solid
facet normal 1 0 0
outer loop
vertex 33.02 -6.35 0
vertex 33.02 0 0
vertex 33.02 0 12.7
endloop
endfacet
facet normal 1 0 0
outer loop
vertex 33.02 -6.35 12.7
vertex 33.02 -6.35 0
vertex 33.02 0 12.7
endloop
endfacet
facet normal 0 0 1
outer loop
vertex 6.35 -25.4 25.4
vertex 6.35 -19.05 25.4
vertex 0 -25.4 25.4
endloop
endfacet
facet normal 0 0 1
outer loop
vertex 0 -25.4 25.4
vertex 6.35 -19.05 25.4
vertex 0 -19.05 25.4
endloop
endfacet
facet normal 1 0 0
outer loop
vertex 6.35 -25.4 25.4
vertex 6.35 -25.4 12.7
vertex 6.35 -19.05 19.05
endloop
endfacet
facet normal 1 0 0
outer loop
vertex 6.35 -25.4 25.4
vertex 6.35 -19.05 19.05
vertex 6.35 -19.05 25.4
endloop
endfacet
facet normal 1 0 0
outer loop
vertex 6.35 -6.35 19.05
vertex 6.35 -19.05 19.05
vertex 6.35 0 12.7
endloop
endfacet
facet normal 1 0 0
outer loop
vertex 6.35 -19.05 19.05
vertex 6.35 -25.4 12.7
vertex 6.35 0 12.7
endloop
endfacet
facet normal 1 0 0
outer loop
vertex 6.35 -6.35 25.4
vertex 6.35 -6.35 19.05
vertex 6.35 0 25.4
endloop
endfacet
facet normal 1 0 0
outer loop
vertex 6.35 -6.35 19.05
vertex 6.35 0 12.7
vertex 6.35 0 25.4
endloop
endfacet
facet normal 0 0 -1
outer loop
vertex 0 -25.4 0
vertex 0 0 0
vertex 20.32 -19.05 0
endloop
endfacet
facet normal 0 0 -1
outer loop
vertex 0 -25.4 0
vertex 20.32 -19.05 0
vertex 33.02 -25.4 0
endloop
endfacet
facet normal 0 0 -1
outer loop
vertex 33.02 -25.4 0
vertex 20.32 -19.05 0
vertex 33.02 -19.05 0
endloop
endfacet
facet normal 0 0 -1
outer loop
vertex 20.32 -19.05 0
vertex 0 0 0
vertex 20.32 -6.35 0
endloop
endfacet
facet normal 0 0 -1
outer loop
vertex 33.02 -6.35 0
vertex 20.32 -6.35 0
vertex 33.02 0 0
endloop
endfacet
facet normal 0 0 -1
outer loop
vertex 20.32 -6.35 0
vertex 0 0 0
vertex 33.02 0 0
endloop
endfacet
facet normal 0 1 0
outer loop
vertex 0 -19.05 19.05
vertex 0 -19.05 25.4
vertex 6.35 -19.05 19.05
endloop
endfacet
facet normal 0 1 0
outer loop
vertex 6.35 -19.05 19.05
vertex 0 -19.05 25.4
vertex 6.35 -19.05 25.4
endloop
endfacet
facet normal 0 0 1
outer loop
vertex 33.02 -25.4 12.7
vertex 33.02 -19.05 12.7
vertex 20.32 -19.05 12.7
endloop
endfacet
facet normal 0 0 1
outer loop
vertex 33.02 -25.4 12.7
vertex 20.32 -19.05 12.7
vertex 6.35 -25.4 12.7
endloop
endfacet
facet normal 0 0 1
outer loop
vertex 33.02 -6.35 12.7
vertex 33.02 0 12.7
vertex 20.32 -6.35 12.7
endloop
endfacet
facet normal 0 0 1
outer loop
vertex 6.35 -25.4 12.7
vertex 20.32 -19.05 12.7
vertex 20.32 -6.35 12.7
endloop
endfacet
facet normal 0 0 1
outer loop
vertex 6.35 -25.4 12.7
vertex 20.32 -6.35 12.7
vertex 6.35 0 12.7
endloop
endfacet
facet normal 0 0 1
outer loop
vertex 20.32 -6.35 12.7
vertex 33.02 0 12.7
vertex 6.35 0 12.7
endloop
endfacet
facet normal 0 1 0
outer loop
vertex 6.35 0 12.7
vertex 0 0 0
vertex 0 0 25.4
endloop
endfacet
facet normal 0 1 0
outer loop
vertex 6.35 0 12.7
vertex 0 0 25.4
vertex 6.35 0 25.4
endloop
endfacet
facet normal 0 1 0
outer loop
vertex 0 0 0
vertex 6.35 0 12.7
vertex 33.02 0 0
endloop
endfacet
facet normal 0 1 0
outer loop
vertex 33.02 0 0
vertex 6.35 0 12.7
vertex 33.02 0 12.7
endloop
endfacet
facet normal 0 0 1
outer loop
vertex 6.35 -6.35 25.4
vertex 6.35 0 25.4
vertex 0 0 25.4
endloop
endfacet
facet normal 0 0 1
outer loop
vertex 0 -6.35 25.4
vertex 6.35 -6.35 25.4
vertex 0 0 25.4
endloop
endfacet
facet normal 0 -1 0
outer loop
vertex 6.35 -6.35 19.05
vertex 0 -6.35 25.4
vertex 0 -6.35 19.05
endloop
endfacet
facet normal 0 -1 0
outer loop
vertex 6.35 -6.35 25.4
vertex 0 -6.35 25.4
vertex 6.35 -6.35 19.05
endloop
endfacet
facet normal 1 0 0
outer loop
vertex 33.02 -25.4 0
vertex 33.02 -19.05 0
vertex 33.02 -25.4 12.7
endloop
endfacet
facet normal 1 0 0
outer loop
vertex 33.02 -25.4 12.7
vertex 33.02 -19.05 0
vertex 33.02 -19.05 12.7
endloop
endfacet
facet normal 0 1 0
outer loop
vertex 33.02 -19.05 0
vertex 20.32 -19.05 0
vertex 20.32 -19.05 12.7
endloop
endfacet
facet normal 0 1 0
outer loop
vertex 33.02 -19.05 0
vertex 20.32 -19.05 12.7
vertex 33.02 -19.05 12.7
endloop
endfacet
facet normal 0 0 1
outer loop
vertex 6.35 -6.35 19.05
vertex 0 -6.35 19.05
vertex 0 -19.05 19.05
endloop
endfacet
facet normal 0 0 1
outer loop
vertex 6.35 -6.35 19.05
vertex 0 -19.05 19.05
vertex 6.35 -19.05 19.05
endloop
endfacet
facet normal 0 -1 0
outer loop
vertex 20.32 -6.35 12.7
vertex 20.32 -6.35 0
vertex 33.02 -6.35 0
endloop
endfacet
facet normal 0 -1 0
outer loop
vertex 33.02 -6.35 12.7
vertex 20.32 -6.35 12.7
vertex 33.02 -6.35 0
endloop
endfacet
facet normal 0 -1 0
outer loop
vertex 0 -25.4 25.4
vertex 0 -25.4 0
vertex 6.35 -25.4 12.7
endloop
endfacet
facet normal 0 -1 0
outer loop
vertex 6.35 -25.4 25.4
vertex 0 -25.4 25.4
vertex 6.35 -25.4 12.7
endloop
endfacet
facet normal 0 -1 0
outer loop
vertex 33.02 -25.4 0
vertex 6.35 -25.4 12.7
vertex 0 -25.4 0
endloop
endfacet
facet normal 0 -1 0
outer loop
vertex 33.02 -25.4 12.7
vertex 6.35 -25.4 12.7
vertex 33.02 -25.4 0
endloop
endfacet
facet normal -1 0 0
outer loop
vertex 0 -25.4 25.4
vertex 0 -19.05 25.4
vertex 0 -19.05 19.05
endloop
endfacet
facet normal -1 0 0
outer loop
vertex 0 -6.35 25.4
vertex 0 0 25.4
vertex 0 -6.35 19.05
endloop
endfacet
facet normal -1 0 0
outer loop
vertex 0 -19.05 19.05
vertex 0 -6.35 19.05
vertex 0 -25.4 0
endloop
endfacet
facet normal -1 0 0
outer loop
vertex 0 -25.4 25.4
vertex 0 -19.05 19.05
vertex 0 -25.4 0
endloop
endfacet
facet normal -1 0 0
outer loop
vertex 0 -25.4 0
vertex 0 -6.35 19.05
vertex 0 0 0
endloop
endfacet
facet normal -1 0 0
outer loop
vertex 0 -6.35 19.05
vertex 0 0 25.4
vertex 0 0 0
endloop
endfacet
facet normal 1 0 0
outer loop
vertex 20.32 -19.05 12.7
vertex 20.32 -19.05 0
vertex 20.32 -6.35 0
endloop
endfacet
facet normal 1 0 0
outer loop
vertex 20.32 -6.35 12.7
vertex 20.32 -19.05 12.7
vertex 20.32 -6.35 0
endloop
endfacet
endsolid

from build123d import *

# Parameters (mm, degrees)
F1_DEPTH = 25.4
F2_W     = 12.7
F2_H     = 12.7
F3_DEPTH = 12.701
F4_W     = 6.35
F4_H     = 12.7
F5_DEPTH = 6.35


with BuildPart() as f1:
    # F0 (on Front) → F1 (new body)
    with BuildSketch(Plane.XZ):
        Polygon((0, 25.4), (0, 0), (33.02, 0), (33.02, 12.7), (6.35, 12.7), (6.35, 25.4), align=None)
    extrude(amount=F1_DEPTH)

    # F2 (on face) → F3 (cut, through all)
    with BuildSketch(Plane.XY.offset(12.7)):
        with Locations((26.67, -12.7)):
            Rectangle(F2_W, F2_H)
    extrude(amount=-F3_DEPTH, mode=Mode.SUBTRACT)

    # F4 (on face) → F5 (cut)
    with BuildSketch(Plane.XY.offset(25.4)):
        with Locations((3.175, -12.7)):
            Rectangle(F4_W, F4_H)
    extrude(amount=-F5_DEPTH, mode=Mode.SUBTRACT)


solid = f1.part
